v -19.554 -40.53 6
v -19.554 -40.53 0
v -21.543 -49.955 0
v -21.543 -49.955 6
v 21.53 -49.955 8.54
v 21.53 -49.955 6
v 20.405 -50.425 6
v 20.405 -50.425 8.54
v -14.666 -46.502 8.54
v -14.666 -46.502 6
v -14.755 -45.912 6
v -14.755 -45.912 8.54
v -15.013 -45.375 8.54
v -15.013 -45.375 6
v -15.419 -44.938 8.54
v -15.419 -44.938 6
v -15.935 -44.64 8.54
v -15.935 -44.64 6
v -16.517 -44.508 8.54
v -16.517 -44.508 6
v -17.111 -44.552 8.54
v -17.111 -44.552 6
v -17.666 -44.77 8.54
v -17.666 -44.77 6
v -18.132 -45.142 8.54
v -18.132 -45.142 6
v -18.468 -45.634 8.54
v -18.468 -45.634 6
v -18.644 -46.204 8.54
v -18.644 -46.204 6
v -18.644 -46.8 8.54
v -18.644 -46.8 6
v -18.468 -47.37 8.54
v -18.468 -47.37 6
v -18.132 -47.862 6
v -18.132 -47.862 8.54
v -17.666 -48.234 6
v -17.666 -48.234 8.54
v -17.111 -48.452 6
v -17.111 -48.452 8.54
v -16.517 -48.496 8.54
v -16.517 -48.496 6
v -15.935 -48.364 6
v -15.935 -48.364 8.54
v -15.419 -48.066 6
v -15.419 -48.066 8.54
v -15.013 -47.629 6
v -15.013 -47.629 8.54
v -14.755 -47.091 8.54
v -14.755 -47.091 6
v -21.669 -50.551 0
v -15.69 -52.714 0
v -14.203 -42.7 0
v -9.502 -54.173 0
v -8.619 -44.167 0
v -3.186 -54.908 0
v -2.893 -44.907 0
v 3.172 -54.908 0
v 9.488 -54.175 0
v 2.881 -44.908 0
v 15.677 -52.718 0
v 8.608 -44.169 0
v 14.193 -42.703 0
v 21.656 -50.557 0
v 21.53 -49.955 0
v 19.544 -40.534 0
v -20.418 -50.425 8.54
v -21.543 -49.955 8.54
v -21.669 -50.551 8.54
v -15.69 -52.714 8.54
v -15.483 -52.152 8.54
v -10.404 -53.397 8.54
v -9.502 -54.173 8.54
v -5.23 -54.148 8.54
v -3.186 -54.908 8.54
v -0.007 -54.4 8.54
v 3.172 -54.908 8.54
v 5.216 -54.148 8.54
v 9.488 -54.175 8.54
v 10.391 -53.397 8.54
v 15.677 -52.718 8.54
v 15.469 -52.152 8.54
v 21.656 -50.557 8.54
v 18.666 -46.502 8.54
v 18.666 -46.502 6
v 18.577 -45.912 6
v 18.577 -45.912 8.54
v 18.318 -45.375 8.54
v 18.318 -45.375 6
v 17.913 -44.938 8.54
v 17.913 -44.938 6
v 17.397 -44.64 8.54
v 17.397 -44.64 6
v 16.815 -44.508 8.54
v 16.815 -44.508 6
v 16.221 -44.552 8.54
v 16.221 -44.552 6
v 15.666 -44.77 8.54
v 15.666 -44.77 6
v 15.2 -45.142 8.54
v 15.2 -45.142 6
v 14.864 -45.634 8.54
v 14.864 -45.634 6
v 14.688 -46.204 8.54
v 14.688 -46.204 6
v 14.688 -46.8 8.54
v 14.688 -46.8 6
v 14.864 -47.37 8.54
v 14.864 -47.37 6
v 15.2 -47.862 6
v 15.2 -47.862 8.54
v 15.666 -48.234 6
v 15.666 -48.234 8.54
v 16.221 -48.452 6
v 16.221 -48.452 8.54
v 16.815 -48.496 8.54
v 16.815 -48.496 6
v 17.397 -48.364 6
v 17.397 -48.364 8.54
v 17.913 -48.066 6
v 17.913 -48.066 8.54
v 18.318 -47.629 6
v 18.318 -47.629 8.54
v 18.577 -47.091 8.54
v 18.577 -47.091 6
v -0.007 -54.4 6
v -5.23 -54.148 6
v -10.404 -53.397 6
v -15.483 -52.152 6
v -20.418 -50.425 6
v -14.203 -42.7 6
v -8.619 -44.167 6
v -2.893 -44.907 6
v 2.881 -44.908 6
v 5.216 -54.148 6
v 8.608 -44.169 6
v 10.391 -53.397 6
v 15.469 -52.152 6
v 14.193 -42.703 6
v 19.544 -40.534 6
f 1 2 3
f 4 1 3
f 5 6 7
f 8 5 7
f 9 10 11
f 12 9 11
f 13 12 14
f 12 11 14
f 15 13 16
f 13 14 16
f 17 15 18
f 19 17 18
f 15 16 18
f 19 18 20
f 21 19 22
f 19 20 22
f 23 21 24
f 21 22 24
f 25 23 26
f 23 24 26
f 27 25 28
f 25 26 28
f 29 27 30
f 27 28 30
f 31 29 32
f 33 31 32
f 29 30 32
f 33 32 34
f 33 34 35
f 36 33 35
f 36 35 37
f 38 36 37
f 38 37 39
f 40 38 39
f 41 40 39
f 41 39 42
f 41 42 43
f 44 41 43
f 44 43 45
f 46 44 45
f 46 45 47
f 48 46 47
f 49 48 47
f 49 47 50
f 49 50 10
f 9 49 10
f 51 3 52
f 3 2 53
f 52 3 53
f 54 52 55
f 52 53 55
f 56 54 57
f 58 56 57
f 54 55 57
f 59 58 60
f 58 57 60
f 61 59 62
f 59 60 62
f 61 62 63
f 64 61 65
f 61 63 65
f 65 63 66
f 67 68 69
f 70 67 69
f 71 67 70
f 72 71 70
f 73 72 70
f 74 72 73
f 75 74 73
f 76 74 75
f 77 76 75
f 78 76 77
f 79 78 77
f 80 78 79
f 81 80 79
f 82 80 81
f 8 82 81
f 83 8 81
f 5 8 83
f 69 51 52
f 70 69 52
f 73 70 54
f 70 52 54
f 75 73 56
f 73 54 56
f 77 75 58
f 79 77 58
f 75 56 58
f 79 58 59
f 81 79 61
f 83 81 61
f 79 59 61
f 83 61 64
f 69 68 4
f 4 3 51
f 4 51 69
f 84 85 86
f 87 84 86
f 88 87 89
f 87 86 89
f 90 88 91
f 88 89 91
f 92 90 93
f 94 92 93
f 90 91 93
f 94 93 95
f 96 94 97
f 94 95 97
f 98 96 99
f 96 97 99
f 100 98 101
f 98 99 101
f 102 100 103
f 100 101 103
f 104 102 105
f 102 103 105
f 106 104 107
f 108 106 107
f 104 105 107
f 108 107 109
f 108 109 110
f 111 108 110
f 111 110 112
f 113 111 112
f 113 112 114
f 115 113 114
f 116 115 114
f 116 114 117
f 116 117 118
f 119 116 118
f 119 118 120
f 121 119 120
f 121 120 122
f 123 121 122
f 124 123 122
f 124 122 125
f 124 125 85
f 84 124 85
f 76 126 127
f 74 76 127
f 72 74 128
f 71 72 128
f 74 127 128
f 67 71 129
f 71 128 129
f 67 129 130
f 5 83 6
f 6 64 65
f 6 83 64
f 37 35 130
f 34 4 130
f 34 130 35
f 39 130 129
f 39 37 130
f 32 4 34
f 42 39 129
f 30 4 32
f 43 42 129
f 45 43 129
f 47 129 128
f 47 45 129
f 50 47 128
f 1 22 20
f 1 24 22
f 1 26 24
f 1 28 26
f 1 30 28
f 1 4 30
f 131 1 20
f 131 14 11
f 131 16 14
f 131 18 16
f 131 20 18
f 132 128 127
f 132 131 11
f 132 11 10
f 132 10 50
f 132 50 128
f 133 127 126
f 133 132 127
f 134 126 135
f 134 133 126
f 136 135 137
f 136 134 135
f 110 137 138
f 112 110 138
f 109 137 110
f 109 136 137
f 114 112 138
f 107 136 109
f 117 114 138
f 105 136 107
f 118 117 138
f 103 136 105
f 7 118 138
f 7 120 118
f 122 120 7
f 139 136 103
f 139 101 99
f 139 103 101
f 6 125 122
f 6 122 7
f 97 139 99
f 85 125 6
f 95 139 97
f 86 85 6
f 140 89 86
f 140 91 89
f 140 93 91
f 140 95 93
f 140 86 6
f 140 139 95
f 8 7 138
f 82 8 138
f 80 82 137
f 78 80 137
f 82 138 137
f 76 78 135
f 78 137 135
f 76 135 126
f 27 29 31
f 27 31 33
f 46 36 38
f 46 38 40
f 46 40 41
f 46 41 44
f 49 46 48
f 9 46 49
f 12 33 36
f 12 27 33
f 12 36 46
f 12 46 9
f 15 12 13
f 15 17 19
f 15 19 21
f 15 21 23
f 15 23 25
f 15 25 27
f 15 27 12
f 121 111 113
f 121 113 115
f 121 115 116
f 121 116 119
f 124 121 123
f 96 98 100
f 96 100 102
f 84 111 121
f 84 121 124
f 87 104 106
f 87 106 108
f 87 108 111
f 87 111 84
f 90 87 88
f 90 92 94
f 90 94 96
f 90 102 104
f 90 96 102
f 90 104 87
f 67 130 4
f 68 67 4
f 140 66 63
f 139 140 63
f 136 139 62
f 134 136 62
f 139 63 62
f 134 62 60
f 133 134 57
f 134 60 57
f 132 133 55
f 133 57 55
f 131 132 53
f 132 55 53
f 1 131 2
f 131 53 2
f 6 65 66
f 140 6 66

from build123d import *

# Parameters (mm, degrees)
SKETCH1_R           = 1.999999943
BOSS_EXTRUDE1_DEPTH = 6
SKETCH1_3_R         = 1.999999943
BOSS_EXTRUDE2_DEPTH = 8.54


with BuildPart() as part:
    # Sketch1 → Boss-Extrude1 (new body)
    with BuildSketch(Plane.XY):
        with BuildLine():
            Line((-19.553972123, -40.529522255), (-21.543248991, -49.954902644))
            Line((-21.543248991, -49.954902644), (-20.41822196, -50.425046499))
            ThreePointArc((-20.41822196, -50.425046499), (-10.404121129, -53.396800588), (-0.006635132, -54.399707743))
            ThreePointArc((-0.006635132, -54.399707743), (10.39066306, -53.396824107), (20.404594428, -50.42516399))
            Line((20.404594428, -50.42516399), (21.529621459, -49.955020135))
            Line((21.529621459, -49.955020135), (19.54391785, -40.534371527))
            ThreePointArc((19.54391785, -40.534371527), (-0.005581304, -44.999999654), (-19.553972123, -40.529522255))
        make_face()
        with Locations((-16.665975394, -46.501988883)):
            Circle(SKETCH1_R, mode=Mode.SUBTRACT)
        with Locations((16.665975394, -46.501988883)):
            Circle(SKETCH1_R, mode=Mode.SUBTRACT)
    extrude(amount=BOSS_EXTRUDE1_DEPTH)

    # Sketch1<3> → Boss-Extrude2 (add)
    with BuildSketch(Plane.XY):
        with BuildLine():
            Line((-20.41822196, -50.425046499), (-21.543248991, -49.954902644))
            Line((-21.543248991, -49.954902644), (-21.669150988, -50.551438115))
            ThreePointArc((-21.669150988, -50.551438115), (-0.006892589, -54.999999568), (21.656480116, -50.556867674))
            Line((21.656480116, -50.556867674), (21.529621459, -49.955020135))
            Line((21.529621459, -49.955020135), (20.404594428, -50.42516399))
            ThreePointArc((20.404594428, -50.42516399), (-0.006825205, -54.399707743), (-20.41822196, -50.425046499))
        make_face()
        with Locations((16.665975394, -46.501988883)):
            Circle(SKETCH1_3_R)
        with Locations((-16.665975394, -46.501988883)):
            Circle(SKETCH1_3_R)
    extrude(amount=BOSS_EXTRUDE2_DEPTH)


solid = part.part
